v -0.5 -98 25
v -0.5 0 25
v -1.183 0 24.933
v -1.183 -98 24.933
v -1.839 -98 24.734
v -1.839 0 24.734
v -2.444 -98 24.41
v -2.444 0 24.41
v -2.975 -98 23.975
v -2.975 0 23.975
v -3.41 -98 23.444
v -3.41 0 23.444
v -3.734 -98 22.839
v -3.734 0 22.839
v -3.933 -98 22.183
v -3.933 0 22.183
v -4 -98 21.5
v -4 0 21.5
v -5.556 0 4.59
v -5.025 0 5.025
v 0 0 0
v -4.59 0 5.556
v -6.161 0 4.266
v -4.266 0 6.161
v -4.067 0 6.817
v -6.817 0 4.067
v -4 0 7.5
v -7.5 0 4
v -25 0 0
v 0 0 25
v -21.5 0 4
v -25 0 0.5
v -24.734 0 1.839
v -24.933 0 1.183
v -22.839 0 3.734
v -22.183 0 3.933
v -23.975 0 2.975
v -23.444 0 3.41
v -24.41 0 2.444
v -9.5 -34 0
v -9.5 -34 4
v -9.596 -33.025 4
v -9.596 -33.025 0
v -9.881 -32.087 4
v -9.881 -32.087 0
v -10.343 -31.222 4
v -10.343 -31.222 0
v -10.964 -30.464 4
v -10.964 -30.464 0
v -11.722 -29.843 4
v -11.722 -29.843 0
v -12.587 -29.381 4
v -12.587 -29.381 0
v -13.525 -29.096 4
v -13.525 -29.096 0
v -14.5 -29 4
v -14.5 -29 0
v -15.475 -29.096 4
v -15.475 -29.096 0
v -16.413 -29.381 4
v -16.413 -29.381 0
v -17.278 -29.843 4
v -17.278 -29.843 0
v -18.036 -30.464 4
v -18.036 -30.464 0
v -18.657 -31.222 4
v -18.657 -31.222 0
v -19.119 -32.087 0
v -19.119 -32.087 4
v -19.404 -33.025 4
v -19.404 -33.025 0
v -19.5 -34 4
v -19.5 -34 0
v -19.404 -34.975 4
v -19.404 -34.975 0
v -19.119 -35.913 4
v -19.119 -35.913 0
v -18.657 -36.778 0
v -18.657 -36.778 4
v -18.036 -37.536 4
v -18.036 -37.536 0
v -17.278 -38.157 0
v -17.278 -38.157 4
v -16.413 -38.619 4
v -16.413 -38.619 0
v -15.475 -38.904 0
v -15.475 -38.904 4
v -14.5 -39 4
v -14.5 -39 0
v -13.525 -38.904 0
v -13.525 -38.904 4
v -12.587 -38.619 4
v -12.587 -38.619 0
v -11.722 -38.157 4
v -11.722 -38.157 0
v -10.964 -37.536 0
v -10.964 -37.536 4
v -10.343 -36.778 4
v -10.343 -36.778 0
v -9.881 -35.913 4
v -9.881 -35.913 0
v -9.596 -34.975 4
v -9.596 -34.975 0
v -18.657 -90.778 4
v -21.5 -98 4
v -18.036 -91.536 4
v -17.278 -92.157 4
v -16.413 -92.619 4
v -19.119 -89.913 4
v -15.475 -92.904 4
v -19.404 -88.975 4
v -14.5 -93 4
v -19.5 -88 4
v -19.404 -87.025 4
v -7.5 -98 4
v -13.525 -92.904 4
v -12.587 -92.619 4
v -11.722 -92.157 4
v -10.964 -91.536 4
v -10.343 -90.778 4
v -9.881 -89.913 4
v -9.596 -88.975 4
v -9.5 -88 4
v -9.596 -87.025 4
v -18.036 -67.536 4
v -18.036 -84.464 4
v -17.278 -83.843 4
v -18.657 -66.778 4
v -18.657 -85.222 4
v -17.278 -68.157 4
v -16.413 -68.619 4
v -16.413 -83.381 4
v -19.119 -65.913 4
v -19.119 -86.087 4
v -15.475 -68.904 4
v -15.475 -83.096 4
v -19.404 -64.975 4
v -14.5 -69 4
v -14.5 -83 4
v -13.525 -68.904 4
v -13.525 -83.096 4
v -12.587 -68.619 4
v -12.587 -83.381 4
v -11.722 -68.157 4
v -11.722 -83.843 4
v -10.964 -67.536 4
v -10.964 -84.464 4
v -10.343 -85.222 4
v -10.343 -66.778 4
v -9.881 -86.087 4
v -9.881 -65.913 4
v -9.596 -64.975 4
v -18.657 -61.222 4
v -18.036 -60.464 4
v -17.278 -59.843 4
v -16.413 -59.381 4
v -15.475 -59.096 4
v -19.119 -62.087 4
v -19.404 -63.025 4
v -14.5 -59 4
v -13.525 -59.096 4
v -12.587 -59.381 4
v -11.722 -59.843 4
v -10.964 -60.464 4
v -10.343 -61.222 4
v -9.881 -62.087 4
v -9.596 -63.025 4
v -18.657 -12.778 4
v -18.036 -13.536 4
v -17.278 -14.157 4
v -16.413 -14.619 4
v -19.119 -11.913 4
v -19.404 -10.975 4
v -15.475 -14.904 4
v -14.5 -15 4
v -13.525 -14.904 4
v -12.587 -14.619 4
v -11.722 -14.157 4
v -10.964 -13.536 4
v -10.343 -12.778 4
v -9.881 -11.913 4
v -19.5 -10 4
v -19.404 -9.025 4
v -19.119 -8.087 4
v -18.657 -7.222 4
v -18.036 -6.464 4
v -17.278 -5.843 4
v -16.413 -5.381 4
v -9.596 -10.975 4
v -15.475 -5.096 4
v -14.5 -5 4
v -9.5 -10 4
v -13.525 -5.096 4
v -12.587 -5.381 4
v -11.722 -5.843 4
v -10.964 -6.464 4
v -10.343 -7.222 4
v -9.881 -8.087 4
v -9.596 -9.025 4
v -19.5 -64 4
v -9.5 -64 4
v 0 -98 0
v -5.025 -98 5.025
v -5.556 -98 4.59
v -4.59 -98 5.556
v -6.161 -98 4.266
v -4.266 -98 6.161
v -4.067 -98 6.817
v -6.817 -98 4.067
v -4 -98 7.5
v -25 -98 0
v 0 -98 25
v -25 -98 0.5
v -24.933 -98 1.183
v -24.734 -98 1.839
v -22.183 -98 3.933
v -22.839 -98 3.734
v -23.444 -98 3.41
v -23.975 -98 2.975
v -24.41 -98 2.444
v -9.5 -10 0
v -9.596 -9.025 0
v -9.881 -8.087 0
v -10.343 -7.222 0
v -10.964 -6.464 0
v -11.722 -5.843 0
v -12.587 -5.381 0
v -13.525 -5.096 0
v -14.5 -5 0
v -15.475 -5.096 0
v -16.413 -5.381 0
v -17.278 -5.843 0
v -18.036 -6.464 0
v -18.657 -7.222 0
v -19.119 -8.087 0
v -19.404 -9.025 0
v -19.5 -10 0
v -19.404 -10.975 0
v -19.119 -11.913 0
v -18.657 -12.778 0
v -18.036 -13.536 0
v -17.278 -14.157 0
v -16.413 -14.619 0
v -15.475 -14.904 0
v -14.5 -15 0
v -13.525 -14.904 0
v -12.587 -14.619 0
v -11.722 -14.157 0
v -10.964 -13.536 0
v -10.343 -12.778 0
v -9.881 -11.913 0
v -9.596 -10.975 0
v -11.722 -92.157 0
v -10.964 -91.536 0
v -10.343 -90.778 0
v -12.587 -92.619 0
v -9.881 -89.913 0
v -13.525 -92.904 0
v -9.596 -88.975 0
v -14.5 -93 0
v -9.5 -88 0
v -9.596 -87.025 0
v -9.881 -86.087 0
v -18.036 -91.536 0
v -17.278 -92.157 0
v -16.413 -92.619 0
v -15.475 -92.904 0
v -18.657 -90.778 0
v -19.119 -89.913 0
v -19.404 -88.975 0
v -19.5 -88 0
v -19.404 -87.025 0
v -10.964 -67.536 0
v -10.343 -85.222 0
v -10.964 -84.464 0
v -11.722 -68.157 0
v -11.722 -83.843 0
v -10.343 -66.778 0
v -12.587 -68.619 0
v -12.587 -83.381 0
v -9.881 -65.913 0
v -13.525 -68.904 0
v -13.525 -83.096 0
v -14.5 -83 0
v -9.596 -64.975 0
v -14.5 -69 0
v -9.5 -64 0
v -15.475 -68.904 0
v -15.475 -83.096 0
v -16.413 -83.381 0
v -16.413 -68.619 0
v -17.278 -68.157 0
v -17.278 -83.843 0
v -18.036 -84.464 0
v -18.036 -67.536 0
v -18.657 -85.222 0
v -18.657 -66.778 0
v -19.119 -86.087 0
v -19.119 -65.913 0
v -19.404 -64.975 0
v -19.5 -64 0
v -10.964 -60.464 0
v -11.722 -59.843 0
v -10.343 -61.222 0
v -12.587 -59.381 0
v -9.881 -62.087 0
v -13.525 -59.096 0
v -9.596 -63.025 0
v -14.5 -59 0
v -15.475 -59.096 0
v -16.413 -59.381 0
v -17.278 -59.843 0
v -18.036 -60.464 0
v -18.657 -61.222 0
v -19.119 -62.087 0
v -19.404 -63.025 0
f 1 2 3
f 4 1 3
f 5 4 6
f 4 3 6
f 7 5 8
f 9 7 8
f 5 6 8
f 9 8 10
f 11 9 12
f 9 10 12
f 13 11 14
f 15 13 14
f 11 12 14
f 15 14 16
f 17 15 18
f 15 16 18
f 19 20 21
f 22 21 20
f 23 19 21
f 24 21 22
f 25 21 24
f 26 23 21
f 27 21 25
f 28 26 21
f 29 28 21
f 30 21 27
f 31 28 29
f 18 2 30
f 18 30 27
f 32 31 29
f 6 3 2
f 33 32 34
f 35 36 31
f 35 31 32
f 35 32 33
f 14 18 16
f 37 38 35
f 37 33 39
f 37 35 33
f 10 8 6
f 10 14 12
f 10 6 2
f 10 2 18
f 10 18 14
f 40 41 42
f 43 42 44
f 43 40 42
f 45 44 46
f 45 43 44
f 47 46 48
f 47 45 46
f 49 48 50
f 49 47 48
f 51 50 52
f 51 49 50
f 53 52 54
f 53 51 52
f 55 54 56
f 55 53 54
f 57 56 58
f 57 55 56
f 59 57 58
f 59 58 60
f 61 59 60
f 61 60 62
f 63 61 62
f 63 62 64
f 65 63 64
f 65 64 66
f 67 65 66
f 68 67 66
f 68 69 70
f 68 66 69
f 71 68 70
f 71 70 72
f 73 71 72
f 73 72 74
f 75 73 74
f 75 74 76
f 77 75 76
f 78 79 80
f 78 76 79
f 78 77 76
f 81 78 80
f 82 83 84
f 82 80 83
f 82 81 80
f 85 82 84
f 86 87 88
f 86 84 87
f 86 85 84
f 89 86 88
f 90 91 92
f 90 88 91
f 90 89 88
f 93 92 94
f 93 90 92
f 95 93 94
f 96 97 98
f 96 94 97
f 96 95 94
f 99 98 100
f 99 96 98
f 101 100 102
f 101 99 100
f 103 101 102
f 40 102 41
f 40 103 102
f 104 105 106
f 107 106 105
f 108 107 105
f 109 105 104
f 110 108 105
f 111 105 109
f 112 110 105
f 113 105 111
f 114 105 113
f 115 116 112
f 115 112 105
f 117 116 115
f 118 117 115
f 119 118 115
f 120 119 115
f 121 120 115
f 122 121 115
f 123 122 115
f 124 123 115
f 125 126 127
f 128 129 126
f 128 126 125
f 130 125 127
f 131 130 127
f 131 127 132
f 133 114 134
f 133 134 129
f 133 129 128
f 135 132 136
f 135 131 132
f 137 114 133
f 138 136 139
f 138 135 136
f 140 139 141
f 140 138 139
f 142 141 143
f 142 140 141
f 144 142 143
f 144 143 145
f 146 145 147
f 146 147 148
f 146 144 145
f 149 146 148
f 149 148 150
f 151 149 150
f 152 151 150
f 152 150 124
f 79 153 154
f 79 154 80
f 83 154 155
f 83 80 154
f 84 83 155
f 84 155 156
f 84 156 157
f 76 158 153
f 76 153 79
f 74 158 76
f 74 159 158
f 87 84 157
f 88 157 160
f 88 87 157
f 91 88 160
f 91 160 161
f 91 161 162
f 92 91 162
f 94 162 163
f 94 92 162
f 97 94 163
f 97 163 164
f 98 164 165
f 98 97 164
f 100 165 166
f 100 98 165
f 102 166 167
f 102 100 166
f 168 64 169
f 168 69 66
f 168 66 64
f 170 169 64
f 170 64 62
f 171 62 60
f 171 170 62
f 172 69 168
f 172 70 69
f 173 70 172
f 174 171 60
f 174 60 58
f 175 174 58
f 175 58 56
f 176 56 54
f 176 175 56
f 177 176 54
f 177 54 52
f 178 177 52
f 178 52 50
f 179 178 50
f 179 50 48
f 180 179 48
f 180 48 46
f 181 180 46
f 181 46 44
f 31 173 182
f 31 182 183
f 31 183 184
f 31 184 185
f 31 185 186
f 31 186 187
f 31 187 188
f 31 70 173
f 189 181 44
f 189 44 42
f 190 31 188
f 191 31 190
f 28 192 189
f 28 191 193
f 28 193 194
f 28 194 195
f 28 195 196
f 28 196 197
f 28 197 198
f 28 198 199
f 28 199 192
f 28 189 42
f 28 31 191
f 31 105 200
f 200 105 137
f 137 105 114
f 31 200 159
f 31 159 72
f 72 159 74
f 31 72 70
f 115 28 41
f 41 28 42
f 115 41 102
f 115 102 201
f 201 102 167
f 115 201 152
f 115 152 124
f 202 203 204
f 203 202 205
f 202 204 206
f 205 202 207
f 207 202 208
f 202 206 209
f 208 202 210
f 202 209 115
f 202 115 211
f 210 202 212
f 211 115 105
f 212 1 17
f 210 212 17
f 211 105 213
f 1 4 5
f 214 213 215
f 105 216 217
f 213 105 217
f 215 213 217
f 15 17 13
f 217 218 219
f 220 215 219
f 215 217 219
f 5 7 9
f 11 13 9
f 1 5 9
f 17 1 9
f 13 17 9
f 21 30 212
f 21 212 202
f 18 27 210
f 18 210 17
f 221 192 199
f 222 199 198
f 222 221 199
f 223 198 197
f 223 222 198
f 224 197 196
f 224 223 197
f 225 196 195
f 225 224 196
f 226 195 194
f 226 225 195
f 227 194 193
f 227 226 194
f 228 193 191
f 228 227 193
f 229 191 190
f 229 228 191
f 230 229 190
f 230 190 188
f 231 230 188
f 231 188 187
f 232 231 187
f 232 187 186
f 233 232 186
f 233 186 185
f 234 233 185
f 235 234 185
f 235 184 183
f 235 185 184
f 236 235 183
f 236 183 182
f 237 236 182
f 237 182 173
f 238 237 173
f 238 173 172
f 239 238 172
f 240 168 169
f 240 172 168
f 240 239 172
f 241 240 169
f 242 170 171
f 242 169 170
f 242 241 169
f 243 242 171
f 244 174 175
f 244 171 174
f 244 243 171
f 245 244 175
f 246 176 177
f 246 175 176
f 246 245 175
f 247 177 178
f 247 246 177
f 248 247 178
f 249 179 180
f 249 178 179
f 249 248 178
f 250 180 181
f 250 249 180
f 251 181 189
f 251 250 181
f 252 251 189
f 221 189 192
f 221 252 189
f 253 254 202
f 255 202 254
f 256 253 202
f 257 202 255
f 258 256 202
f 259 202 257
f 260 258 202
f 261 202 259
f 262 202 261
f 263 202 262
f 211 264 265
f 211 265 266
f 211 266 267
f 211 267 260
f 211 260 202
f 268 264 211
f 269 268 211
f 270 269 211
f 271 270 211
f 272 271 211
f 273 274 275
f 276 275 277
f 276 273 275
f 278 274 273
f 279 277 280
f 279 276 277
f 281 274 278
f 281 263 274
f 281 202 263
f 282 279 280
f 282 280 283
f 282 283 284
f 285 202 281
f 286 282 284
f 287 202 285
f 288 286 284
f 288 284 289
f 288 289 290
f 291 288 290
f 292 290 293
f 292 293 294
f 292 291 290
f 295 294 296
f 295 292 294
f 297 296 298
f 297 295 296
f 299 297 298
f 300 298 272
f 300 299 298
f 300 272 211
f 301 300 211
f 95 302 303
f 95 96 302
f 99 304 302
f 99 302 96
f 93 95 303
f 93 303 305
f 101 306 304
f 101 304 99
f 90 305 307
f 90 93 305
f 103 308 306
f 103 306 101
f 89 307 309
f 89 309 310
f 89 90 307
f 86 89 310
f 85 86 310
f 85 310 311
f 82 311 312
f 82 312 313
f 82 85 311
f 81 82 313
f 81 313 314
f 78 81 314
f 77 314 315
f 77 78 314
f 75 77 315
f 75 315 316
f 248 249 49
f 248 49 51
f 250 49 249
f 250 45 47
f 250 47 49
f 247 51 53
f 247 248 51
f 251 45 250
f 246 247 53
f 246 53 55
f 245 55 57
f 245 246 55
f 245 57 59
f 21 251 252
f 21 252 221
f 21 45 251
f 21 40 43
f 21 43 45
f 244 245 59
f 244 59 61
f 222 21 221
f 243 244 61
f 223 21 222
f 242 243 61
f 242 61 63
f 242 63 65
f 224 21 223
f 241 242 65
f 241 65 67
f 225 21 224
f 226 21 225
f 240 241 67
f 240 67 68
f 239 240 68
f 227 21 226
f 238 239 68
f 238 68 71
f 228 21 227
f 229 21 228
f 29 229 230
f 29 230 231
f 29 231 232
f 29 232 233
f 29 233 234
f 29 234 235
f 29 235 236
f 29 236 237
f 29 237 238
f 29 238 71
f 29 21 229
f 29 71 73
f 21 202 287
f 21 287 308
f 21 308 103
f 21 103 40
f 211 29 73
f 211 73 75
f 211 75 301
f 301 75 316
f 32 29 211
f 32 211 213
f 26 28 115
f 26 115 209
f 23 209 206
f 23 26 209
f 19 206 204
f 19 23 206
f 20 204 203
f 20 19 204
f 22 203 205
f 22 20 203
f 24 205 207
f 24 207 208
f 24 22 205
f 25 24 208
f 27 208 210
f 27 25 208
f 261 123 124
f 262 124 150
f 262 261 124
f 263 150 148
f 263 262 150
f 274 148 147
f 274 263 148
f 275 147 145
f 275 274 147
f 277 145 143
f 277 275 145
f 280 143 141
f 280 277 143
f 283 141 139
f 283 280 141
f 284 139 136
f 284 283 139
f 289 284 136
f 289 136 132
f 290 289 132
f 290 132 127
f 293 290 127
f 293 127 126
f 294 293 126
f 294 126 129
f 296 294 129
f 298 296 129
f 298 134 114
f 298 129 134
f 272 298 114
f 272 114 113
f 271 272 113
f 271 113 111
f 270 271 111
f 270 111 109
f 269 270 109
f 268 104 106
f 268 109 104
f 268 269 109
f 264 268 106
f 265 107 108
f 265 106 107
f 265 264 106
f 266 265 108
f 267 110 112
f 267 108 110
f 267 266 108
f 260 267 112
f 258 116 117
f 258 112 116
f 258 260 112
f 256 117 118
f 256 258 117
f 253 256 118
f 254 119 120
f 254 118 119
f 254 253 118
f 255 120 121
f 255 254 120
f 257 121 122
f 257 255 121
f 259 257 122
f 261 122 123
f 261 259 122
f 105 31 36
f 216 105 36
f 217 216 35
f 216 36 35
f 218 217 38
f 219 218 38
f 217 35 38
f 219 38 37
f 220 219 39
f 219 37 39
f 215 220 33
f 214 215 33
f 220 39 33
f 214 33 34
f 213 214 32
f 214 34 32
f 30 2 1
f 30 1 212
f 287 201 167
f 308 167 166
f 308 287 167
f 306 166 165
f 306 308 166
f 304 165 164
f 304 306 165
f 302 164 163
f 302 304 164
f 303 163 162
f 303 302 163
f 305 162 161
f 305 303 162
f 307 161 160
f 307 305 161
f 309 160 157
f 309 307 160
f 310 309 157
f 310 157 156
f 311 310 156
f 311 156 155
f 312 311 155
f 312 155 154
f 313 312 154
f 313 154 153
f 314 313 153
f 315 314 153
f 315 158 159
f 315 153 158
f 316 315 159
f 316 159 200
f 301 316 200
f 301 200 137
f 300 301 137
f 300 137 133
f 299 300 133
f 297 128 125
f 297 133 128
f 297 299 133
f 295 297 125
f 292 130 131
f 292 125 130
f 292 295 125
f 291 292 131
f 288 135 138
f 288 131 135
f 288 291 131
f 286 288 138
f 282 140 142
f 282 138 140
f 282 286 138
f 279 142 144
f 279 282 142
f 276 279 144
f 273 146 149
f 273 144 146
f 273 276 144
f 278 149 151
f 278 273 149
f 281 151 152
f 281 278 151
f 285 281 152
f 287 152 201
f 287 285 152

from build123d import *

# Parameters (mm, degrees)
PAD_DEPTH    = 98
SKETCH001_R  = 5
POCKET_DEPTH = 25.001


with BuildPart() as part:
    # Sketch → Pad (new body)
    with BuildSketch(Plane.XZ):
        with BuildLine():
            Line((0, 0), (-25, 0))
            Line((-25, 0), (-25, 0.5))
            ThreePointArc((-21.5, 4), (-23.974874, 2.974874), (-25, 0.5))
            Line((-21.5, 4), (-7.5, 4))
            ThreePointArc((-7.5, 4), (-5.025126, 5.025126), (-4, 7.5))
            Line((-4, 7.5), (-4, 21.5))
            ThreePointArc((-0.5, 25), (-2.974874, 23.974874), (-4, 21.5))
            Line((-0.5, 25), (0, 25))
            Line((0, 25), (0, 0))
        make_face()
    extrude(amount=PAD_DEPTH)

    # Sketch001 → Pocket (cut, through all)
    with BuildSketch(Plane.XY):
        with Locations((-14.5, -10)):
            Circle(SKETCH001_R)
        with Locations((-14.5, -34)):
            Circle(SKETCH001_R)
        with Locations((-14.5, -88)):
            Circle(SKETCH001_R)
        with Locations((-14.5, -64)):
            Circle(SKETCH001_R)
    extrude(amount=POCKET_DEPTH, mode=Mode.SUBTRACT)


solid = part.part
